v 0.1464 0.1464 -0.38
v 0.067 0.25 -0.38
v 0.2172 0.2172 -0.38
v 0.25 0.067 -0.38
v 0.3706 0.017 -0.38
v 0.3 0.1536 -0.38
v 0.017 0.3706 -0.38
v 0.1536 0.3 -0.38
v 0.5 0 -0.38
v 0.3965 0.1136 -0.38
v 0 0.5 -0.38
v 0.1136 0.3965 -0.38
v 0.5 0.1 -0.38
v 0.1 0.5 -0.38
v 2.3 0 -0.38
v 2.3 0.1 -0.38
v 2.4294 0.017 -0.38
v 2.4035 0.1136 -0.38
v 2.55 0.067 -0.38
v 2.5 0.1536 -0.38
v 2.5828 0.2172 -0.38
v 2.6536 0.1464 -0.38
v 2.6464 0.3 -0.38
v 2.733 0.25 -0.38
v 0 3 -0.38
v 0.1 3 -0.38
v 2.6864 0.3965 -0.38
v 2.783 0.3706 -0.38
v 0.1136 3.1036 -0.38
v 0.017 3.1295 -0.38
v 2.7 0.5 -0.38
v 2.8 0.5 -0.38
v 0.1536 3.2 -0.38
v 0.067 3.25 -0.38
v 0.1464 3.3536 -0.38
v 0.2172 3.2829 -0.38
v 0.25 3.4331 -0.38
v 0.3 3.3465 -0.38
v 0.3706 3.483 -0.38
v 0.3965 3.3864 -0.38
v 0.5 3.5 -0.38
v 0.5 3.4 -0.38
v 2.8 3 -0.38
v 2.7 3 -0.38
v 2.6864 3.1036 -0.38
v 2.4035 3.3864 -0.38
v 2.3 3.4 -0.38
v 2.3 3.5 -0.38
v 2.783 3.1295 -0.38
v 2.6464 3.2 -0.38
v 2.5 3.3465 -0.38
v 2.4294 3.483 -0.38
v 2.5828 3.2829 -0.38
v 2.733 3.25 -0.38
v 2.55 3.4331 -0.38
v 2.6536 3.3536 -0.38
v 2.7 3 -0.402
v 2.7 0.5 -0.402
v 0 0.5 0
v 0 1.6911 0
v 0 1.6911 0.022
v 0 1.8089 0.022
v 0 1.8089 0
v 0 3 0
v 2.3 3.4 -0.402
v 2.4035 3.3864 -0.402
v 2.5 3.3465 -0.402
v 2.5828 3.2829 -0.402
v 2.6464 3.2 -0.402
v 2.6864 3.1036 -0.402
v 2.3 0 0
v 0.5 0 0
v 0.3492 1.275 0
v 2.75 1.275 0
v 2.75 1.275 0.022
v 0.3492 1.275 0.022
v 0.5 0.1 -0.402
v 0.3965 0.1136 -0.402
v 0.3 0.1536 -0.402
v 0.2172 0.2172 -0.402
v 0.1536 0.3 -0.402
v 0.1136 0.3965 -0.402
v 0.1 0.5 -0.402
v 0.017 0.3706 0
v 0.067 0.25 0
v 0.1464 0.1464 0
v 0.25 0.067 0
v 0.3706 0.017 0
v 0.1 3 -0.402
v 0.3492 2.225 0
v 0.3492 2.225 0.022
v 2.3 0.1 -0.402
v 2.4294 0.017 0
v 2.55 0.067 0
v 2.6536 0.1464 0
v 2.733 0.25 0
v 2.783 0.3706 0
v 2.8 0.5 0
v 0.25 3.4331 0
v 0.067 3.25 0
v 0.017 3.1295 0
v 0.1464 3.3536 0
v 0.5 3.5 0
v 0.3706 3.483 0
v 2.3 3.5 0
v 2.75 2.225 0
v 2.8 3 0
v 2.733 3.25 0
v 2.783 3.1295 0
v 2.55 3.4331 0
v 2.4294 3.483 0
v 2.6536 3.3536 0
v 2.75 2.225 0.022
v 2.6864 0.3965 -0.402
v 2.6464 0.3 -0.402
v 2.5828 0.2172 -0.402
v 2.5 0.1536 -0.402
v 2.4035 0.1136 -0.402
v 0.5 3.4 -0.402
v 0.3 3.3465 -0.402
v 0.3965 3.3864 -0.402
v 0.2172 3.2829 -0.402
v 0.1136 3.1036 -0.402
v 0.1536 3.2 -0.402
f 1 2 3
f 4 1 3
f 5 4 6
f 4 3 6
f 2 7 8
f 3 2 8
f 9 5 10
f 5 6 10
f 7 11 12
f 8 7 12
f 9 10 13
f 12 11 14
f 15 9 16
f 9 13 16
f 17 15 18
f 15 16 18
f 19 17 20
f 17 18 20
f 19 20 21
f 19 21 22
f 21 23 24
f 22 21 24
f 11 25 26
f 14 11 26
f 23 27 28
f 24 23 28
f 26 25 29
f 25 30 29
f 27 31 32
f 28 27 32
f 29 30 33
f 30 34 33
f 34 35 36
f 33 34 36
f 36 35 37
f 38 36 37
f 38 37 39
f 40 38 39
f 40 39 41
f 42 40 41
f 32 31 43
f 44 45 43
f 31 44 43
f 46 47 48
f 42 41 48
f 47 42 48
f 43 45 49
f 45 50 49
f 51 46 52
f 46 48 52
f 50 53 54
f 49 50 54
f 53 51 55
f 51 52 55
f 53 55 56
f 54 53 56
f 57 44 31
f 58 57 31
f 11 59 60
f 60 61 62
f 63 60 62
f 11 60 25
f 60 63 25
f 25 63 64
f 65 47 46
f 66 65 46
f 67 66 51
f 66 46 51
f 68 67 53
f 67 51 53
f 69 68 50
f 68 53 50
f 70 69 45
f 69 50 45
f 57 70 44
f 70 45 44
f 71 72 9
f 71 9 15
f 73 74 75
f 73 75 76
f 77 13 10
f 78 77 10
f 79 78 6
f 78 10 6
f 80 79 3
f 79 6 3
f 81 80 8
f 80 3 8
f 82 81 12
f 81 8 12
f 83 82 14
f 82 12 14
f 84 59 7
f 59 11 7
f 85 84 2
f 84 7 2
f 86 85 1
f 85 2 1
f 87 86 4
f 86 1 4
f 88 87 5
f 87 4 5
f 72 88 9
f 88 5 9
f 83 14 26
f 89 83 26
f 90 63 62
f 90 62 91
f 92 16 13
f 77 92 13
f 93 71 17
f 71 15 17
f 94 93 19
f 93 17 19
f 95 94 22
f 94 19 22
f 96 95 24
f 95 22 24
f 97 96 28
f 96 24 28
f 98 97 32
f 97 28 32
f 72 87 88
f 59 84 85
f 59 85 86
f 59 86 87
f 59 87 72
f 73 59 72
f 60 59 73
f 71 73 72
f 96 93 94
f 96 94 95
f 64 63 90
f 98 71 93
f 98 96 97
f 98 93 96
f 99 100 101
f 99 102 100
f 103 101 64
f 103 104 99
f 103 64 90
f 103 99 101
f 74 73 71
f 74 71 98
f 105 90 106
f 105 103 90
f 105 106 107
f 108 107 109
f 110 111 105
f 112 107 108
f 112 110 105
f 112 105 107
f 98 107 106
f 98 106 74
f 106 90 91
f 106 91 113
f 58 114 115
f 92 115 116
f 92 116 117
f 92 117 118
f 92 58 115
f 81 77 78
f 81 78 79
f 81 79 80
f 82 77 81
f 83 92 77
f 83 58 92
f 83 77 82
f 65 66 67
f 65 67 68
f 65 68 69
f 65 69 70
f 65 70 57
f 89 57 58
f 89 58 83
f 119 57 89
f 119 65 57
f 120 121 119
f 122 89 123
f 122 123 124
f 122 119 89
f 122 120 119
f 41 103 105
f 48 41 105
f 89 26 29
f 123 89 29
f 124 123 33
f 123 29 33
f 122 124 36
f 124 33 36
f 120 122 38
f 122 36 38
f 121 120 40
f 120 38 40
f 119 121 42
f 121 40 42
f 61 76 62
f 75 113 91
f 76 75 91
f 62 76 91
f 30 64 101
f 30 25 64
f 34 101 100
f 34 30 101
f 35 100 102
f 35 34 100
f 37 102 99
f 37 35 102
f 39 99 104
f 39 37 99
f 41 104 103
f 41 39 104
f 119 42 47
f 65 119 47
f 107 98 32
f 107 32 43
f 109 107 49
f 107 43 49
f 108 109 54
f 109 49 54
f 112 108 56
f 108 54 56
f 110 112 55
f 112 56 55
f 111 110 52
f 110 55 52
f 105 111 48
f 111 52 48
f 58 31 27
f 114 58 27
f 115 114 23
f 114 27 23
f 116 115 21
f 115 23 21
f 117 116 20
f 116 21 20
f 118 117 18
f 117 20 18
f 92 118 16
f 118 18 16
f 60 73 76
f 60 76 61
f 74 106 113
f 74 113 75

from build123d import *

# Parameters (mm, degrees)
SKETCH1_W           = 2.8
SKETCH1_H           = 3.500049162
BOSS_EXTRUDE1_DEPTH = 0.38
FILLET1_R           = 0.5
BOSS_EXTRUDE2_DEPTH = 0.022
BOSS_EXTRUDE3_DEPTH = 0.022


with BuildPart() as part:
    # Sketch1 → Boss-Extrude1 (new body)
    with BuildSketch(Plane.XY):
        with Locations((1.4, 1.750024557)):
            Rectangle(SKETCH1_W, SKETCH1_H)
    extrude(amount=-BOSS_EXTRUDE1_DEPTH)

    # Fillet1
    fillet1_edges = [part.edges().sort_by_distance(p)[0] for p in [
        (2.8, -2.4e-08, -0.19),
        (0, -2.4e-08, -0.19),
        (0, 3.500049138, -0.19),
        (2.8, 3.500049138, -0.19),
    ]]
    fillet(fillet1_edges, radius=FILLET1_R)

    # Sketch2 → Boss-Extrude2 (add)
    with BuildSketch(Plane.XY):
        Polygon((0, 1.691100092), (0, 1.808949022), (0.3492, 2.225024557), (2.75, 2.225024557), (2.75, 1.275024557), (0.3492, 1.275024557), align=None)
    extrude(amount=BOSS_EXTRUDE2_DEPTH)

    # Sketch3 → Boss-Extrude3 (add)
    with BuildSketch(Plane(origin=(0, 0, -0.38), x_dir=(-1, 0, 0), z_dir=(0, 0, -1))):
        with BuildLine():
            Line((-2.7, 3.000049138), (-2.7, 0.499999976))
            ThreePointArc((-2.7, 0.499999976), (-2.582842712, 0.217157263), (-2.3, 0.099999976))
            Line((-2.3, 0.099999976), (-0.5, 0.099999976))
            ThreePointArc((-0.5, 0.099999976), (-0.217157288, 0.217157263), (-0.1, 0.499999976))
            Line((-0.1, 0.499999976), (-0.1, 3.000049138))
            ThreePointArc((-0.1, 3.000049138), (-0.217157288, 3.282891851), (-0.5, 3.400049138))
            Line((-0.5, 3.400049138), (-2.3, 3.400049138))
            ThreePointArc((-2.3, 3.400049138), (-2.582842712, 3.282891851), (-2.7, 3.000049138))
        make_face()
    extrude(amount=BOSS_EXTRUDE3_DEPTH)


solid = part.part
